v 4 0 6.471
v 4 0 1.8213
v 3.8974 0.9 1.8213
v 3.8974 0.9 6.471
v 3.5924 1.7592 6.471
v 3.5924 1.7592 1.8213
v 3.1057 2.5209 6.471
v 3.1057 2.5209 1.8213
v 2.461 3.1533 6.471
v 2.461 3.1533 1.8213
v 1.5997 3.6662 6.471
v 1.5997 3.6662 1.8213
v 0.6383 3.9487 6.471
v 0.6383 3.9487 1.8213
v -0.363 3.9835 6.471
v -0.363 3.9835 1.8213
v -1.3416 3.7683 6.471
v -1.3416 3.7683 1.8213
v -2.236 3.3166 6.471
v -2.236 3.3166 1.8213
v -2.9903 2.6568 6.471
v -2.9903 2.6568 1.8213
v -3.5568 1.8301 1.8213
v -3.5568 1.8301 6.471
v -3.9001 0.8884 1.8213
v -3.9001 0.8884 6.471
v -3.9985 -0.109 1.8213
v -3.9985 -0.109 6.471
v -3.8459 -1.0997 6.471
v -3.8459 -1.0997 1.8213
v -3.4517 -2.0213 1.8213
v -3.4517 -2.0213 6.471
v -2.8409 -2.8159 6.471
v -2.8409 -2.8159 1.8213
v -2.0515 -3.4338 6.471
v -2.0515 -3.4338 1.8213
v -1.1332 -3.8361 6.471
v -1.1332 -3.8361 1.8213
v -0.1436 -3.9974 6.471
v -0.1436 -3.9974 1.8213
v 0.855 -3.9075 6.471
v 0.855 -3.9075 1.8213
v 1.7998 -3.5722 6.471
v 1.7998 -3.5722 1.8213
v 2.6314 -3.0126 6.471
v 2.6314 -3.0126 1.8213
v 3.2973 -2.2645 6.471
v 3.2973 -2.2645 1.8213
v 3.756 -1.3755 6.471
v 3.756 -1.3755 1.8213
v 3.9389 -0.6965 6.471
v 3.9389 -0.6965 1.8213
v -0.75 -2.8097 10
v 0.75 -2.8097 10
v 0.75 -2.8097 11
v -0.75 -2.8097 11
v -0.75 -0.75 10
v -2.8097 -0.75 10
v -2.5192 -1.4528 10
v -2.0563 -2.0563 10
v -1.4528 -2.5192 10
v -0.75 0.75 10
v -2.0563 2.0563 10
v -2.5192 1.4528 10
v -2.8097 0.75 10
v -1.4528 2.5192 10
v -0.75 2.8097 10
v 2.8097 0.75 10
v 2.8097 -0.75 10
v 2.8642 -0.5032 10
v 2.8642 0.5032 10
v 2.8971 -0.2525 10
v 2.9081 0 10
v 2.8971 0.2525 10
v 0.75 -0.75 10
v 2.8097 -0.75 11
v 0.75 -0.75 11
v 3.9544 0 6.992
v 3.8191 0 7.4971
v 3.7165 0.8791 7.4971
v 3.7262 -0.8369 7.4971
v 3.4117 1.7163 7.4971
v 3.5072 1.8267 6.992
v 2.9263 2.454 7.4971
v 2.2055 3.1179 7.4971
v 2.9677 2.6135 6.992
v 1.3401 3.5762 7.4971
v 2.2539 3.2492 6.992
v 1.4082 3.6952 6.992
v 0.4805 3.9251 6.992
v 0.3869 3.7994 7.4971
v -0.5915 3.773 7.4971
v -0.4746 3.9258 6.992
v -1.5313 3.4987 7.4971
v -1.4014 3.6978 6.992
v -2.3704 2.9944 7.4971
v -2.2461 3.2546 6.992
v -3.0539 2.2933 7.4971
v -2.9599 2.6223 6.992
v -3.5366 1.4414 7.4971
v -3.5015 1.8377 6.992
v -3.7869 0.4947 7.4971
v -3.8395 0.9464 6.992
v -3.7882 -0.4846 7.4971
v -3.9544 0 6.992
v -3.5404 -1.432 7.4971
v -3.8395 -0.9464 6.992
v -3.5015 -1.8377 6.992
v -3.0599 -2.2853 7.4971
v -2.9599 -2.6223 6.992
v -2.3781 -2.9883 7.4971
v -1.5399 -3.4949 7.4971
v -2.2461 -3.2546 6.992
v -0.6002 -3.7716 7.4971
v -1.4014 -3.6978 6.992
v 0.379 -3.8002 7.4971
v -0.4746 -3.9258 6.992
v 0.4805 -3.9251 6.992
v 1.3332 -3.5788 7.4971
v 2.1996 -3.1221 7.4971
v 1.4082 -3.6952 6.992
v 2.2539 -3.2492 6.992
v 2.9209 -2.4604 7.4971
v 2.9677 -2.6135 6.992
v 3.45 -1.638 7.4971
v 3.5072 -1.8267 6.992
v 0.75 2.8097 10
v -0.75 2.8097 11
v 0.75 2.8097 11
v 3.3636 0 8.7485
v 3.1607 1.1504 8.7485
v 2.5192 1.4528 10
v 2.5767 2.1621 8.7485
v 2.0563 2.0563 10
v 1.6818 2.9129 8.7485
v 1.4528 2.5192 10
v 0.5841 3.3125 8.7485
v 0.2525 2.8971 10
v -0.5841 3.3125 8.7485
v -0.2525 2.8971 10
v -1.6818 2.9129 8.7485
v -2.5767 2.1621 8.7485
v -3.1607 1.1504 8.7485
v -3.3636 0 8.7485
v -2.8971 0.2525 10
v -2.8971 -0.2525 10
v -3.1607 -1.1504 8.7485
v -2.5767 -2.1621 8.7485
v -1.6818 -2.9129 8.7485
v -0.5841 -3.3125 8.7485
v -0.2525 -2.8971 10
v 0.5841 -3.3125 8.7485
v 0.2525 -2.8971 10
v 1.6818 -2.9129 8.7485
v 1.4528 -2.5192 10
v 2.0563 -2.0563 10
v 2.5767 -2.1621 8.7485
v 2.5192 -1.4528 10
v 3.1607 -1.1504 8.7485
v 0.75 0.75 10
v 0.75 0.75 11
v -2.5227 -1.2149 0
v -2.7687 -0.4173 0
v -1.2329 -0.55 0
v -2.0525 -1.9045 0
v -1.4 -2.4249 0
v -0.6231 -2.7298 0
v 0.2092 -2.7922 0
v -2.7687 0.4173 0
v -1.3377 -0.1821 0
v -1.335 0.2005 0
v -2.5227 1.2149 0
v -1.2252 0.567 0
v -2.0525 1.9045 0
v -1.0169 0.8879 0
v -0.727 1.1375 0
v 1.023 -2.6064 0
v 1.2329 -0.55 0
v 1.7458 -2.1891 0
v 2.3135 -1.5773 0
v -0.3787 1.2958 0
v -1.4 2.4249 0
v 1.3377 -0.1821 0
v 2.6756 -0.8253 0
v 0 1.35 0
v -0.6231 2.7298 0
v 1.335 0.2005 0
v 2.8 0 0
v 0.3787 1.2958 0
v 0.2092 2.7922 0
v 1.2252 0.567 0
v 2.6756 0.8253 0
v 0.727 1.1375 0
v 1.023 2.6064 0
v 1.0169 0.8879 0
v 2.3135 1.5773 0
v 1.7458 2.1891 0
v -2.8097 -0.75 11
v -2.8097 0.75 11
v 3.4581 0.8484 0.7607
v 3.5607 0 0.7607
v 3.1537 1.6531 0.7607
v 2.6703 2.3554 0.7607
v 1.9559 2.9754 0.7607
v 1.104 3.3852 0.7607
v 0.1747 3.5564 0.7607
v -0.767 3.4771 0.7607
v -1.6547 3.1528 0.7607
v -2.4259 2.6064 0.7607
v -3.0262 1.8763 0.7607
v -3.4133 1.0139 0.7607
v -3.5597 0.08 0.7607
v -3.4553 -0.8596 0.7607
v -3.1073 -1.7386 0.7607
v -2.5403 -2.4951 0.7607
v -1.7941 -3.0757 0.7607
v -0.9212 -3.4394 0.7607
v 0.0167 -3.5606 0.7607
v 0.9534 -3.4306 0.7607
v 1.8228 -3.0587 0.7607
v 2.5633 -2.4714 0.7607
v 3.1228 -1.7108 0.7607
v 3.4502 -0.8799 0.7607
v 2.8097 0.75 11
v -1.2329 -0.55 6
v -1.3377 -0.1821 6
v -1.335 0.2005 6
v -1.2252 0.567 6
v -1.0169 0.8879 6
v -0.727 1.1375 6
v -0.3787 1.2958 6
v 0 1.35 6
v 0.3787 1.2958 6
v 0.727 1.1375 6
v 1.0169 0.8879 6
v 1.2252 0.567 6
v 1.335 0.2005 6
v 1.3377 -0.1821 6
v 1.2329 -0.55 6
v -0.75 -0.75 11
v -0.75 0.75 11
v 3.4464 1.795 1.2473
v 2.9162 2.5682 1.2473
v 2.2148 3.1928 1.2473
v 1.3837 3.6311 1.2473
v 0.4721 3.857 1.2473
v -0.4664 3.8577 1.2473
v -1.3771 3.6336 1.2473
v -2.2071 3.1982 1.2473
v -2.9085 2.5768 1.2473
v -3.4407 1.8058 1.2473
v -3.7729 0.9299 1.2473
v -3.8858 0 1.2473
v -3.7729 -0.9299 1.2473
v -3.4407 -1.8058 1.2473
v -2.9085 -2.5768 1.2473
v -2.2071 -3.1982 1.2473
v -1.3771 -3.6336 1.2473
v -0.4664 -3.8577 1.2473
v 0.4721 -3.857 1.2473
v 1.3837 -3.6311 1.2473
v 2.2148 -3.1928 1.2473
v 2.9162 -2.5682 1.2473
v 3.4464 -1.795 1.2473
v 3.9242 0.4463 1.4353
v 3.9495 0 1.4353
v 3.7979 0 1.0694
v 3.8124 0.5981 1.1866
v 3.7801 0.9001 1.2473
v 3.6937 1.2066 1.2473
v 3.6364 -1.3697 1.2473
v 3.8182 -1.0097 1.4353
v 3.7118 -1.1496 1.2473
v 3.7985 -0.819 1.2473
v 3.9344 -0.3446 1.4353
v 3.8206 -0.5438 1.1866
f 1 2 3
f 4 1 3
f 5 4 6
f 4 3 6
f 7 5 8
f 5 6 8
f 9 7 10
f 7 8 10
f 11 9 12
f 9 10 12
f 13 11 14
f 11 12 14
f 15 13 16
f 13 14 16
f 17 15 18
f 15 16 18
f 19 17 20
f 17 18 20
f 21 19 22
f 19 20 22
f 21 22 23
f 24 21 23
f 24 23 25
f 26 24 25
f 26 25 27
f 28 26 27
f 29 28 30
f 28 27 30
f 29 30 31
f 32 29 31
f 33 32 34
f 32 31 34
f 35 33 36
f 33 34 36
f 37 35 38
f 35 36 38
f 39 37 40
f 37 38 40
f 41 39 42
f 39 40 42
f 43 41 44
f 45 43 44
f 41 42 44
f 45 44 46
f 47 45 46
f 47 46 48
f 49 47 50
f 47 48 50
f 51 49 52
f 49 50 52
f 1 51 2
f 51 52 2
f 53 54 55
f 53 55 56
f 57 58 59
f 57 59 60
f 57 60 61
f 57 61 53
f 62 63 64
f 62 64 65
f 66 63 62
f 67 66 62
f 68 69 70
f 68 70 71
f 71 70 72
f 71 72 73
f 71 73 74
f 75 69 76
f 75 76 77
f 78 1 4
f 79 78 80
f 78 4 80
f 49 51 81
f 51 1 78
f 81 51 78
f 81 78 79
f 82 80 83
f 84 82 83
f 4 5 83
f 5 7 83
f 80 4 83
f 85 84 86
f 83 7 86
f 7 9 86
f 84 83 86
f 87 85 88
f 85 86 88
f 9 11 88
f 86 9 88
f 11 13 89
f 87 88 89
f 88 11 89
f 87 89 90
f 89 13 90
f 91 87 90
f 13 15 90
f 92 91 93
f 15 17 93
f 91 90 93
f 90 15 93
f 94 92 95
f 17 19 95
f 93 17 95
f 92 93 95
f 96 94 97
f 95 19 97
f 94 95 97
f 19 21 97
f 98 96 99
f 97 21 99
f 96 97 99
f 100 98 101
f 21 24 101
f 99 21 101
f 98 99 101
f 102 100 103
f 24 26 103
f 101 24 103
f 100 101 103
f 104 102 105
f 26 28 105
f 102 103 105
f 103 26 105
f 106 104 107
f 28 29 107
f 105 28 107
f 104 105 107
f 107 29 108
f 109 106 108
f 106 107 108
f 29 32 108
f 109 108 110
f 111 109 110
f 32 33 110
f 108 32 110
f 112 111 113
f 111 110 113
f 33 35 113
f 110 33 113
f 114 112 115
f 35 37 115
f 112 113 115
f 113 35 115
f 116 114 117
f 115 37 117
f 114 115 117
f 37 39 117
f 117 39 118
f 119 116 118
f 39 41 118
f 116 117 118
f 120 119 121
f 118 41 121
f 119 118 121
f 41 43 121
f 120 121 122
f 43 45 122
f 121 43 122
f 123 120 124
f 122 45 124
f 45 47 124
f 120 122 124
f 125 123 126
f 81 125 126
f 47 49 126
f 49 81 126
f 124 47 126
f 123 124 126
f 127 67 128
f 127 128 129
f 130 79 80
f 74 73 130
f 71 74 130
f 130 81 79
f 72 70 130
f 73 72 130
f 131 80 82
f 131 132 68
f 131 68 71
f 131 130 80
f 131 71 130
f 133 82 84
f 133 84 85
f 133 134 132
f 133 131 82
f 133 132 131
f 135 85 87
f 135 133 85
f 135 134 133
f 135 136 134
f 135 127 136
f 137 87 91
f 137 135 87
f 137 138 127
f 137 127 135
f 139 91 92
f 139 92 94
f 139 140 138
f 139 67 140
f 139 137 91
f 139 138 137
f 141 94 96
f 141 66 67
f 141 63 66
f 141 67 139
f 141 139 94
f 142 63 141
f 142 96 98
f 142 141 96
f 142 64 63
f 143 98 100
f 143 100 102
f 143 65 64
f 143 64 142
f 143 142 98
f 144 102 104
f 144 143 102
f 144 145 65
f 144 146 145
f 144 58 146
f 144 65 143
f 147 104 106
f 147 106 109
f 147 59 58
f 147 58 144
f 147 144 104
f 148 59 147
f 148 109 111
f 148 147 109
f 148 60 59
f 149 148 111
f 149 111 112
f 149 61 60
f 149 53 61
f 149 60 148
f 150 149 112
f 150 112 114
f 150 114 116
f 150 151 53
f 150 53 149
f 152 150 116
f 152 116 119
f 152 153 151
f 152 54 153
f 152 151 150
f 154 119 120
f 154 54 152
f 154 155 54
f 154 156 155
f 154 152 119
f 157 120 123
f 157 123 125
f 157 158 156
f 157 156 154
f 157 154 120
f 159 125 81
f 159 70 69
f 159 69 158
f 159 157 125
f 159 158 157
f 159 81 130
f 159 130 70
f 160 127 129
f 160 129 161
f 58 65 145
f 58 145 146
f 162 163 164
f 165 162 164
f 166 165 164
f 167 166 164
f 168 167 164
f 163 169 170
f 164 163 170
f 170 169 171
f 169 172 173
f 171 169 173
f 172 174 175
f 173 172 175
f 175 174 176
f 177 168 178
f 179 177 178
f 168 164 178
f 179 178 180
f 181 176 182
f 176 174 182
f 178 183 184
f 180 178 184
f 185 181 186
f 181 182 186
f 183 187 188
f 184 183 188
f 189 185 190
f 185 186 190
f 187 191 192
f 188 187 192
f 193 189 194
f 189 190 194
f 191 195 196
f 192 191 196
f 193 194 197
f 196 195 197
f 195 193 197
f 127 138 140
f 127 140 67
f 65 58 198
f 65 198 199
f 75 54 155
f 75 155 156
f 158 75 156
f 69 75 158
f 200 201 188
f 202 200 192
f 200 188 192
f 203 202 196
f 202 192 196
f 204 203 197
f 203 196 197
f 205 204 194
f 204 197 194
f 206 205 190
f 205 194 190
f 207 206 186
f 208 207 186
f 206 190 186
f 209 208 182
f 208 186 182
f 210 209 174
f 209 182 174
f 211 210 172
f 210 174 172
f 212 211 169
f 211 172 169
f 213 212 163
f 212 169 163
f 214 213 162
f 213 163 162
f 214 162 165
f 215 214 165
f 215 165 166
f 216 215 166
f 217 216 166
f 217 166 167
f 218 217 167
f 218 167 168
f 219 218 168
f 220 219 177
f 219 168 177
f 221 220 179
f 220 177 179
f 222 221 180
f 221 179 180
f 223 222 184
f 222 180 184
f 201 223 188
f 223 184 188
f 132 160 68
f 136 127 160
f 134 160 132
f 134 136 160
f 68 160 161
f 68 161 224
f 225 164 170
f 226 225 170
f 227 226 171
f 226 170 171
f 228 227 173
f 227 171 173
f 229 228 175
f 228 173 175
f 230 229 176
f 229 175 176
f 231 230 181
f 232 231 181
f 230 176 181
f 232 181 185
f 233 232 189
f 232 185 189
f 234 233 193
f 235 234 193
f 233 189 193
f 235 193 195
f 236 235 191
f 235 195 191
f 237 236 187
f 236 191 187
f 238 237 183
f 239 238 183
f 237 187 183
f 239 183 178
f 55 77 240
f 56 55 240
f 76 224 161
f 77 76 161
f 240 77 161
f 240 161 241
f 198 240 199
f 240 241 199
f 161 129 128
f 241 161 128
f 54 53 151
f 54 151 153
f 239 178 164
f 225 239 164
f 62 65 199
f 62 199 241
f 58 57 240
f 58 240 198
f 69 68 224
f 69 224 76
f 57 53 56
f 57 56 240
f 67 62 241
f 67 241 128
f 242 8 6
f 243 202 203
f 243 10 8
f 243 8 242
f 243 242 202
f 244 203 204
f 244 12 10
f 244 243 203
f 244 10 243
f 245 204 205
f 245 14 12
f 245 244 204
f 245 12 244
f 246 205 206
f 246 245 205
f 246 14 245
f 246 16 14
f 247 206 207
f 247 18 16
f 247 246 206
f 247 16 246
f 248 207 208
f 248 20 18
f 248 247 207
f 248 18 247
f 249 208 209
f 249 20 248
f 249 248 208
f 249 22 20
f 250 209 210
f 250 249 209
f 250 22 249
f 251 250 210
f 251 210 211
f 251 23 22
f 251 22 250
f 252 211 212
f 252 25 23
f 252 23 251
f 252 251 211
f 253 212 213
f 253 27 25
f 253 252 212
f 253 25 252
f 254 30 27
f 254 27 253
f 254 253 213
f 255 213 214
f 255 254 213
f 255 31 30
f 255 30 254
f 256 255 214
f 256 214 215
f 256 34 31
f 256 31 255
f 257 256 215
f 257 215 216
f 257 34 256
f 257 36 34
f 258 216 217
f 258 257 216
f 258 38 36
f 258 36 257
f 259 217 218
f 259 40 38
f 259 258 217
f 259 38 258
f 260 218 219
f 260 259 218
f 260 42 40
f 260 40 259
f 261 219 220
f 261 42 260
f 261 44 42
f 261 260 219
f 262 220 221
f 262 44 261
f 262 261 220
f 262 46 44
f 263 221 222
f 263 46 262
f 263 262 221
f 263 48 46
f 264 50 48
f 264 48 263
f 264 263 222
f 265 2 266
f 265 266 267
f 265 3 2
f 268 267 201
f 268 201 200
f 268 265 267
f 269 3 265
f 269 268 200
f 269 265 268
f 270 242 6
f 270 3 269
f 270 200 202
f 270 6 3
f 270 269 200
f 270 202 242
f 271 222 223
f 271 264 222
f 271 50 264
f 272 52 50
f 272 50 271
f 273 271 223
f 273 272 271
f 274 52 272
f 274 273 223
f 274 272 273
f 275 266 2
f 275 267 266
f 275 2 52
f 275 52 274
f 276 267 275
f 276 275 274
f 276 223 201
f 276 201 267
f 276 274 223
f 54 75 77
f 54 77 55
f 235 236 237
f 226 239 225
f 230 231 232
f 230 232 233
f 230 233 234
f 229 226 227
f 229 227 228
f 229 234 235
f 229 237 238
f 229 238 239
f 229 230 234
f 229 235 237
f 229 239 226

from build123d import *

# Parameters (mm, degrees)
SKETCH1_R           = 4
BOSS_EXTRUDE1_DEPTH = 10
CHAMFER1_SIZE       = 3
CHAMFER1_SIZE2      = 1.091910703
CUT_EXTRUDE1_DEPTH  = 6
CHAMFER2_SIZE       = 1.2
FILLET1_R           = 3
FILLET2_R           = 1.5
BOSS_EXTRUDE2_DEPTH = 1


with BuildPart() as part:
    # Sketch1 → Boss-Extrude1 (new body)
    with BuildSketch(Plane.XY):
        Circle(SKETCH1_R)
    extrude(amount=BOSS_EXTRUDE1_DEPTH)

    # Chamfer1
    chamfer1_edges = [part.edges().sort_by_distance(p)[0] for p in [
        (-4, 0, 10),
    ]]
    chamfer1_side = [part.faces().sort_by_distance(p)[0] for p in [
        (-4, 0, 5),
    ]]
    chamfer(chamfer1_edges, length=CHAMFER1_SIZE, length2=CHAMFER1_SIZE2, reference=chamfer1_side[0])

    # Sketch2 → Cut-Extrude1 (cut)
    with BuildSketch(Plane(origin=(0, 0, 0), x_dir=(-1, 0, 0), z_dir=(0, 0, -1))):
        with BuildLine():
            Line((-1.232882801, -0.55), (1.232882801, -0.55))
            ThreePointArc((1.232882801, -0.55), (0, 1.35), (-1.232882801, -0.55))
        make_face()
    extrude(amount=-CUT_EXTRUDE1_DEPTH, mode=Mode.SUBTRACT)

    # Chamfer2
    chamfer2_edges = [part.edges().sort_by_distance(p)[0] for p in [
        (-4, 0, 0),
    ]]
    chamfer(chamfer2_edges, length=CHAMFER2_SIZE)

    # Fillet1
    fillet1_edges = [part.edges().sort_by_distance(p)[0] for p in [
        (-4, 0, 7),
    ]]
    fillet(fillet1_edges, radius=FILLET1_R)

    # Fillet2
    fillet2_edges = [part.edges().sort_by_distance(p)[0] for p in [
        (-4, 0, 1.2),
    ]]
    fillet(fillet2_edges, radius=FILLET2_R)

    # Sketch3 → Boss-Extrude2 (add)
    with BuildSketch(Plane.XY.offset(10)):
        Polygon((-2.809712327, 0.75), (-0.75, 0.75), (-0.75, 2.809712327), (0.75, 2.809712327), (0.75, 0.75), (2.809712327, 0.75), (2.809712327, -0.75), (0.75, -0.75), (0.75, -2.809712327), (-0.75, -2.809712327), (-0.75, -0.75), (-2.809712327, -0.75), align=None)
    extrude(amount=BOSS_EXTRUDE2_DEPTH)


solid = part.part
